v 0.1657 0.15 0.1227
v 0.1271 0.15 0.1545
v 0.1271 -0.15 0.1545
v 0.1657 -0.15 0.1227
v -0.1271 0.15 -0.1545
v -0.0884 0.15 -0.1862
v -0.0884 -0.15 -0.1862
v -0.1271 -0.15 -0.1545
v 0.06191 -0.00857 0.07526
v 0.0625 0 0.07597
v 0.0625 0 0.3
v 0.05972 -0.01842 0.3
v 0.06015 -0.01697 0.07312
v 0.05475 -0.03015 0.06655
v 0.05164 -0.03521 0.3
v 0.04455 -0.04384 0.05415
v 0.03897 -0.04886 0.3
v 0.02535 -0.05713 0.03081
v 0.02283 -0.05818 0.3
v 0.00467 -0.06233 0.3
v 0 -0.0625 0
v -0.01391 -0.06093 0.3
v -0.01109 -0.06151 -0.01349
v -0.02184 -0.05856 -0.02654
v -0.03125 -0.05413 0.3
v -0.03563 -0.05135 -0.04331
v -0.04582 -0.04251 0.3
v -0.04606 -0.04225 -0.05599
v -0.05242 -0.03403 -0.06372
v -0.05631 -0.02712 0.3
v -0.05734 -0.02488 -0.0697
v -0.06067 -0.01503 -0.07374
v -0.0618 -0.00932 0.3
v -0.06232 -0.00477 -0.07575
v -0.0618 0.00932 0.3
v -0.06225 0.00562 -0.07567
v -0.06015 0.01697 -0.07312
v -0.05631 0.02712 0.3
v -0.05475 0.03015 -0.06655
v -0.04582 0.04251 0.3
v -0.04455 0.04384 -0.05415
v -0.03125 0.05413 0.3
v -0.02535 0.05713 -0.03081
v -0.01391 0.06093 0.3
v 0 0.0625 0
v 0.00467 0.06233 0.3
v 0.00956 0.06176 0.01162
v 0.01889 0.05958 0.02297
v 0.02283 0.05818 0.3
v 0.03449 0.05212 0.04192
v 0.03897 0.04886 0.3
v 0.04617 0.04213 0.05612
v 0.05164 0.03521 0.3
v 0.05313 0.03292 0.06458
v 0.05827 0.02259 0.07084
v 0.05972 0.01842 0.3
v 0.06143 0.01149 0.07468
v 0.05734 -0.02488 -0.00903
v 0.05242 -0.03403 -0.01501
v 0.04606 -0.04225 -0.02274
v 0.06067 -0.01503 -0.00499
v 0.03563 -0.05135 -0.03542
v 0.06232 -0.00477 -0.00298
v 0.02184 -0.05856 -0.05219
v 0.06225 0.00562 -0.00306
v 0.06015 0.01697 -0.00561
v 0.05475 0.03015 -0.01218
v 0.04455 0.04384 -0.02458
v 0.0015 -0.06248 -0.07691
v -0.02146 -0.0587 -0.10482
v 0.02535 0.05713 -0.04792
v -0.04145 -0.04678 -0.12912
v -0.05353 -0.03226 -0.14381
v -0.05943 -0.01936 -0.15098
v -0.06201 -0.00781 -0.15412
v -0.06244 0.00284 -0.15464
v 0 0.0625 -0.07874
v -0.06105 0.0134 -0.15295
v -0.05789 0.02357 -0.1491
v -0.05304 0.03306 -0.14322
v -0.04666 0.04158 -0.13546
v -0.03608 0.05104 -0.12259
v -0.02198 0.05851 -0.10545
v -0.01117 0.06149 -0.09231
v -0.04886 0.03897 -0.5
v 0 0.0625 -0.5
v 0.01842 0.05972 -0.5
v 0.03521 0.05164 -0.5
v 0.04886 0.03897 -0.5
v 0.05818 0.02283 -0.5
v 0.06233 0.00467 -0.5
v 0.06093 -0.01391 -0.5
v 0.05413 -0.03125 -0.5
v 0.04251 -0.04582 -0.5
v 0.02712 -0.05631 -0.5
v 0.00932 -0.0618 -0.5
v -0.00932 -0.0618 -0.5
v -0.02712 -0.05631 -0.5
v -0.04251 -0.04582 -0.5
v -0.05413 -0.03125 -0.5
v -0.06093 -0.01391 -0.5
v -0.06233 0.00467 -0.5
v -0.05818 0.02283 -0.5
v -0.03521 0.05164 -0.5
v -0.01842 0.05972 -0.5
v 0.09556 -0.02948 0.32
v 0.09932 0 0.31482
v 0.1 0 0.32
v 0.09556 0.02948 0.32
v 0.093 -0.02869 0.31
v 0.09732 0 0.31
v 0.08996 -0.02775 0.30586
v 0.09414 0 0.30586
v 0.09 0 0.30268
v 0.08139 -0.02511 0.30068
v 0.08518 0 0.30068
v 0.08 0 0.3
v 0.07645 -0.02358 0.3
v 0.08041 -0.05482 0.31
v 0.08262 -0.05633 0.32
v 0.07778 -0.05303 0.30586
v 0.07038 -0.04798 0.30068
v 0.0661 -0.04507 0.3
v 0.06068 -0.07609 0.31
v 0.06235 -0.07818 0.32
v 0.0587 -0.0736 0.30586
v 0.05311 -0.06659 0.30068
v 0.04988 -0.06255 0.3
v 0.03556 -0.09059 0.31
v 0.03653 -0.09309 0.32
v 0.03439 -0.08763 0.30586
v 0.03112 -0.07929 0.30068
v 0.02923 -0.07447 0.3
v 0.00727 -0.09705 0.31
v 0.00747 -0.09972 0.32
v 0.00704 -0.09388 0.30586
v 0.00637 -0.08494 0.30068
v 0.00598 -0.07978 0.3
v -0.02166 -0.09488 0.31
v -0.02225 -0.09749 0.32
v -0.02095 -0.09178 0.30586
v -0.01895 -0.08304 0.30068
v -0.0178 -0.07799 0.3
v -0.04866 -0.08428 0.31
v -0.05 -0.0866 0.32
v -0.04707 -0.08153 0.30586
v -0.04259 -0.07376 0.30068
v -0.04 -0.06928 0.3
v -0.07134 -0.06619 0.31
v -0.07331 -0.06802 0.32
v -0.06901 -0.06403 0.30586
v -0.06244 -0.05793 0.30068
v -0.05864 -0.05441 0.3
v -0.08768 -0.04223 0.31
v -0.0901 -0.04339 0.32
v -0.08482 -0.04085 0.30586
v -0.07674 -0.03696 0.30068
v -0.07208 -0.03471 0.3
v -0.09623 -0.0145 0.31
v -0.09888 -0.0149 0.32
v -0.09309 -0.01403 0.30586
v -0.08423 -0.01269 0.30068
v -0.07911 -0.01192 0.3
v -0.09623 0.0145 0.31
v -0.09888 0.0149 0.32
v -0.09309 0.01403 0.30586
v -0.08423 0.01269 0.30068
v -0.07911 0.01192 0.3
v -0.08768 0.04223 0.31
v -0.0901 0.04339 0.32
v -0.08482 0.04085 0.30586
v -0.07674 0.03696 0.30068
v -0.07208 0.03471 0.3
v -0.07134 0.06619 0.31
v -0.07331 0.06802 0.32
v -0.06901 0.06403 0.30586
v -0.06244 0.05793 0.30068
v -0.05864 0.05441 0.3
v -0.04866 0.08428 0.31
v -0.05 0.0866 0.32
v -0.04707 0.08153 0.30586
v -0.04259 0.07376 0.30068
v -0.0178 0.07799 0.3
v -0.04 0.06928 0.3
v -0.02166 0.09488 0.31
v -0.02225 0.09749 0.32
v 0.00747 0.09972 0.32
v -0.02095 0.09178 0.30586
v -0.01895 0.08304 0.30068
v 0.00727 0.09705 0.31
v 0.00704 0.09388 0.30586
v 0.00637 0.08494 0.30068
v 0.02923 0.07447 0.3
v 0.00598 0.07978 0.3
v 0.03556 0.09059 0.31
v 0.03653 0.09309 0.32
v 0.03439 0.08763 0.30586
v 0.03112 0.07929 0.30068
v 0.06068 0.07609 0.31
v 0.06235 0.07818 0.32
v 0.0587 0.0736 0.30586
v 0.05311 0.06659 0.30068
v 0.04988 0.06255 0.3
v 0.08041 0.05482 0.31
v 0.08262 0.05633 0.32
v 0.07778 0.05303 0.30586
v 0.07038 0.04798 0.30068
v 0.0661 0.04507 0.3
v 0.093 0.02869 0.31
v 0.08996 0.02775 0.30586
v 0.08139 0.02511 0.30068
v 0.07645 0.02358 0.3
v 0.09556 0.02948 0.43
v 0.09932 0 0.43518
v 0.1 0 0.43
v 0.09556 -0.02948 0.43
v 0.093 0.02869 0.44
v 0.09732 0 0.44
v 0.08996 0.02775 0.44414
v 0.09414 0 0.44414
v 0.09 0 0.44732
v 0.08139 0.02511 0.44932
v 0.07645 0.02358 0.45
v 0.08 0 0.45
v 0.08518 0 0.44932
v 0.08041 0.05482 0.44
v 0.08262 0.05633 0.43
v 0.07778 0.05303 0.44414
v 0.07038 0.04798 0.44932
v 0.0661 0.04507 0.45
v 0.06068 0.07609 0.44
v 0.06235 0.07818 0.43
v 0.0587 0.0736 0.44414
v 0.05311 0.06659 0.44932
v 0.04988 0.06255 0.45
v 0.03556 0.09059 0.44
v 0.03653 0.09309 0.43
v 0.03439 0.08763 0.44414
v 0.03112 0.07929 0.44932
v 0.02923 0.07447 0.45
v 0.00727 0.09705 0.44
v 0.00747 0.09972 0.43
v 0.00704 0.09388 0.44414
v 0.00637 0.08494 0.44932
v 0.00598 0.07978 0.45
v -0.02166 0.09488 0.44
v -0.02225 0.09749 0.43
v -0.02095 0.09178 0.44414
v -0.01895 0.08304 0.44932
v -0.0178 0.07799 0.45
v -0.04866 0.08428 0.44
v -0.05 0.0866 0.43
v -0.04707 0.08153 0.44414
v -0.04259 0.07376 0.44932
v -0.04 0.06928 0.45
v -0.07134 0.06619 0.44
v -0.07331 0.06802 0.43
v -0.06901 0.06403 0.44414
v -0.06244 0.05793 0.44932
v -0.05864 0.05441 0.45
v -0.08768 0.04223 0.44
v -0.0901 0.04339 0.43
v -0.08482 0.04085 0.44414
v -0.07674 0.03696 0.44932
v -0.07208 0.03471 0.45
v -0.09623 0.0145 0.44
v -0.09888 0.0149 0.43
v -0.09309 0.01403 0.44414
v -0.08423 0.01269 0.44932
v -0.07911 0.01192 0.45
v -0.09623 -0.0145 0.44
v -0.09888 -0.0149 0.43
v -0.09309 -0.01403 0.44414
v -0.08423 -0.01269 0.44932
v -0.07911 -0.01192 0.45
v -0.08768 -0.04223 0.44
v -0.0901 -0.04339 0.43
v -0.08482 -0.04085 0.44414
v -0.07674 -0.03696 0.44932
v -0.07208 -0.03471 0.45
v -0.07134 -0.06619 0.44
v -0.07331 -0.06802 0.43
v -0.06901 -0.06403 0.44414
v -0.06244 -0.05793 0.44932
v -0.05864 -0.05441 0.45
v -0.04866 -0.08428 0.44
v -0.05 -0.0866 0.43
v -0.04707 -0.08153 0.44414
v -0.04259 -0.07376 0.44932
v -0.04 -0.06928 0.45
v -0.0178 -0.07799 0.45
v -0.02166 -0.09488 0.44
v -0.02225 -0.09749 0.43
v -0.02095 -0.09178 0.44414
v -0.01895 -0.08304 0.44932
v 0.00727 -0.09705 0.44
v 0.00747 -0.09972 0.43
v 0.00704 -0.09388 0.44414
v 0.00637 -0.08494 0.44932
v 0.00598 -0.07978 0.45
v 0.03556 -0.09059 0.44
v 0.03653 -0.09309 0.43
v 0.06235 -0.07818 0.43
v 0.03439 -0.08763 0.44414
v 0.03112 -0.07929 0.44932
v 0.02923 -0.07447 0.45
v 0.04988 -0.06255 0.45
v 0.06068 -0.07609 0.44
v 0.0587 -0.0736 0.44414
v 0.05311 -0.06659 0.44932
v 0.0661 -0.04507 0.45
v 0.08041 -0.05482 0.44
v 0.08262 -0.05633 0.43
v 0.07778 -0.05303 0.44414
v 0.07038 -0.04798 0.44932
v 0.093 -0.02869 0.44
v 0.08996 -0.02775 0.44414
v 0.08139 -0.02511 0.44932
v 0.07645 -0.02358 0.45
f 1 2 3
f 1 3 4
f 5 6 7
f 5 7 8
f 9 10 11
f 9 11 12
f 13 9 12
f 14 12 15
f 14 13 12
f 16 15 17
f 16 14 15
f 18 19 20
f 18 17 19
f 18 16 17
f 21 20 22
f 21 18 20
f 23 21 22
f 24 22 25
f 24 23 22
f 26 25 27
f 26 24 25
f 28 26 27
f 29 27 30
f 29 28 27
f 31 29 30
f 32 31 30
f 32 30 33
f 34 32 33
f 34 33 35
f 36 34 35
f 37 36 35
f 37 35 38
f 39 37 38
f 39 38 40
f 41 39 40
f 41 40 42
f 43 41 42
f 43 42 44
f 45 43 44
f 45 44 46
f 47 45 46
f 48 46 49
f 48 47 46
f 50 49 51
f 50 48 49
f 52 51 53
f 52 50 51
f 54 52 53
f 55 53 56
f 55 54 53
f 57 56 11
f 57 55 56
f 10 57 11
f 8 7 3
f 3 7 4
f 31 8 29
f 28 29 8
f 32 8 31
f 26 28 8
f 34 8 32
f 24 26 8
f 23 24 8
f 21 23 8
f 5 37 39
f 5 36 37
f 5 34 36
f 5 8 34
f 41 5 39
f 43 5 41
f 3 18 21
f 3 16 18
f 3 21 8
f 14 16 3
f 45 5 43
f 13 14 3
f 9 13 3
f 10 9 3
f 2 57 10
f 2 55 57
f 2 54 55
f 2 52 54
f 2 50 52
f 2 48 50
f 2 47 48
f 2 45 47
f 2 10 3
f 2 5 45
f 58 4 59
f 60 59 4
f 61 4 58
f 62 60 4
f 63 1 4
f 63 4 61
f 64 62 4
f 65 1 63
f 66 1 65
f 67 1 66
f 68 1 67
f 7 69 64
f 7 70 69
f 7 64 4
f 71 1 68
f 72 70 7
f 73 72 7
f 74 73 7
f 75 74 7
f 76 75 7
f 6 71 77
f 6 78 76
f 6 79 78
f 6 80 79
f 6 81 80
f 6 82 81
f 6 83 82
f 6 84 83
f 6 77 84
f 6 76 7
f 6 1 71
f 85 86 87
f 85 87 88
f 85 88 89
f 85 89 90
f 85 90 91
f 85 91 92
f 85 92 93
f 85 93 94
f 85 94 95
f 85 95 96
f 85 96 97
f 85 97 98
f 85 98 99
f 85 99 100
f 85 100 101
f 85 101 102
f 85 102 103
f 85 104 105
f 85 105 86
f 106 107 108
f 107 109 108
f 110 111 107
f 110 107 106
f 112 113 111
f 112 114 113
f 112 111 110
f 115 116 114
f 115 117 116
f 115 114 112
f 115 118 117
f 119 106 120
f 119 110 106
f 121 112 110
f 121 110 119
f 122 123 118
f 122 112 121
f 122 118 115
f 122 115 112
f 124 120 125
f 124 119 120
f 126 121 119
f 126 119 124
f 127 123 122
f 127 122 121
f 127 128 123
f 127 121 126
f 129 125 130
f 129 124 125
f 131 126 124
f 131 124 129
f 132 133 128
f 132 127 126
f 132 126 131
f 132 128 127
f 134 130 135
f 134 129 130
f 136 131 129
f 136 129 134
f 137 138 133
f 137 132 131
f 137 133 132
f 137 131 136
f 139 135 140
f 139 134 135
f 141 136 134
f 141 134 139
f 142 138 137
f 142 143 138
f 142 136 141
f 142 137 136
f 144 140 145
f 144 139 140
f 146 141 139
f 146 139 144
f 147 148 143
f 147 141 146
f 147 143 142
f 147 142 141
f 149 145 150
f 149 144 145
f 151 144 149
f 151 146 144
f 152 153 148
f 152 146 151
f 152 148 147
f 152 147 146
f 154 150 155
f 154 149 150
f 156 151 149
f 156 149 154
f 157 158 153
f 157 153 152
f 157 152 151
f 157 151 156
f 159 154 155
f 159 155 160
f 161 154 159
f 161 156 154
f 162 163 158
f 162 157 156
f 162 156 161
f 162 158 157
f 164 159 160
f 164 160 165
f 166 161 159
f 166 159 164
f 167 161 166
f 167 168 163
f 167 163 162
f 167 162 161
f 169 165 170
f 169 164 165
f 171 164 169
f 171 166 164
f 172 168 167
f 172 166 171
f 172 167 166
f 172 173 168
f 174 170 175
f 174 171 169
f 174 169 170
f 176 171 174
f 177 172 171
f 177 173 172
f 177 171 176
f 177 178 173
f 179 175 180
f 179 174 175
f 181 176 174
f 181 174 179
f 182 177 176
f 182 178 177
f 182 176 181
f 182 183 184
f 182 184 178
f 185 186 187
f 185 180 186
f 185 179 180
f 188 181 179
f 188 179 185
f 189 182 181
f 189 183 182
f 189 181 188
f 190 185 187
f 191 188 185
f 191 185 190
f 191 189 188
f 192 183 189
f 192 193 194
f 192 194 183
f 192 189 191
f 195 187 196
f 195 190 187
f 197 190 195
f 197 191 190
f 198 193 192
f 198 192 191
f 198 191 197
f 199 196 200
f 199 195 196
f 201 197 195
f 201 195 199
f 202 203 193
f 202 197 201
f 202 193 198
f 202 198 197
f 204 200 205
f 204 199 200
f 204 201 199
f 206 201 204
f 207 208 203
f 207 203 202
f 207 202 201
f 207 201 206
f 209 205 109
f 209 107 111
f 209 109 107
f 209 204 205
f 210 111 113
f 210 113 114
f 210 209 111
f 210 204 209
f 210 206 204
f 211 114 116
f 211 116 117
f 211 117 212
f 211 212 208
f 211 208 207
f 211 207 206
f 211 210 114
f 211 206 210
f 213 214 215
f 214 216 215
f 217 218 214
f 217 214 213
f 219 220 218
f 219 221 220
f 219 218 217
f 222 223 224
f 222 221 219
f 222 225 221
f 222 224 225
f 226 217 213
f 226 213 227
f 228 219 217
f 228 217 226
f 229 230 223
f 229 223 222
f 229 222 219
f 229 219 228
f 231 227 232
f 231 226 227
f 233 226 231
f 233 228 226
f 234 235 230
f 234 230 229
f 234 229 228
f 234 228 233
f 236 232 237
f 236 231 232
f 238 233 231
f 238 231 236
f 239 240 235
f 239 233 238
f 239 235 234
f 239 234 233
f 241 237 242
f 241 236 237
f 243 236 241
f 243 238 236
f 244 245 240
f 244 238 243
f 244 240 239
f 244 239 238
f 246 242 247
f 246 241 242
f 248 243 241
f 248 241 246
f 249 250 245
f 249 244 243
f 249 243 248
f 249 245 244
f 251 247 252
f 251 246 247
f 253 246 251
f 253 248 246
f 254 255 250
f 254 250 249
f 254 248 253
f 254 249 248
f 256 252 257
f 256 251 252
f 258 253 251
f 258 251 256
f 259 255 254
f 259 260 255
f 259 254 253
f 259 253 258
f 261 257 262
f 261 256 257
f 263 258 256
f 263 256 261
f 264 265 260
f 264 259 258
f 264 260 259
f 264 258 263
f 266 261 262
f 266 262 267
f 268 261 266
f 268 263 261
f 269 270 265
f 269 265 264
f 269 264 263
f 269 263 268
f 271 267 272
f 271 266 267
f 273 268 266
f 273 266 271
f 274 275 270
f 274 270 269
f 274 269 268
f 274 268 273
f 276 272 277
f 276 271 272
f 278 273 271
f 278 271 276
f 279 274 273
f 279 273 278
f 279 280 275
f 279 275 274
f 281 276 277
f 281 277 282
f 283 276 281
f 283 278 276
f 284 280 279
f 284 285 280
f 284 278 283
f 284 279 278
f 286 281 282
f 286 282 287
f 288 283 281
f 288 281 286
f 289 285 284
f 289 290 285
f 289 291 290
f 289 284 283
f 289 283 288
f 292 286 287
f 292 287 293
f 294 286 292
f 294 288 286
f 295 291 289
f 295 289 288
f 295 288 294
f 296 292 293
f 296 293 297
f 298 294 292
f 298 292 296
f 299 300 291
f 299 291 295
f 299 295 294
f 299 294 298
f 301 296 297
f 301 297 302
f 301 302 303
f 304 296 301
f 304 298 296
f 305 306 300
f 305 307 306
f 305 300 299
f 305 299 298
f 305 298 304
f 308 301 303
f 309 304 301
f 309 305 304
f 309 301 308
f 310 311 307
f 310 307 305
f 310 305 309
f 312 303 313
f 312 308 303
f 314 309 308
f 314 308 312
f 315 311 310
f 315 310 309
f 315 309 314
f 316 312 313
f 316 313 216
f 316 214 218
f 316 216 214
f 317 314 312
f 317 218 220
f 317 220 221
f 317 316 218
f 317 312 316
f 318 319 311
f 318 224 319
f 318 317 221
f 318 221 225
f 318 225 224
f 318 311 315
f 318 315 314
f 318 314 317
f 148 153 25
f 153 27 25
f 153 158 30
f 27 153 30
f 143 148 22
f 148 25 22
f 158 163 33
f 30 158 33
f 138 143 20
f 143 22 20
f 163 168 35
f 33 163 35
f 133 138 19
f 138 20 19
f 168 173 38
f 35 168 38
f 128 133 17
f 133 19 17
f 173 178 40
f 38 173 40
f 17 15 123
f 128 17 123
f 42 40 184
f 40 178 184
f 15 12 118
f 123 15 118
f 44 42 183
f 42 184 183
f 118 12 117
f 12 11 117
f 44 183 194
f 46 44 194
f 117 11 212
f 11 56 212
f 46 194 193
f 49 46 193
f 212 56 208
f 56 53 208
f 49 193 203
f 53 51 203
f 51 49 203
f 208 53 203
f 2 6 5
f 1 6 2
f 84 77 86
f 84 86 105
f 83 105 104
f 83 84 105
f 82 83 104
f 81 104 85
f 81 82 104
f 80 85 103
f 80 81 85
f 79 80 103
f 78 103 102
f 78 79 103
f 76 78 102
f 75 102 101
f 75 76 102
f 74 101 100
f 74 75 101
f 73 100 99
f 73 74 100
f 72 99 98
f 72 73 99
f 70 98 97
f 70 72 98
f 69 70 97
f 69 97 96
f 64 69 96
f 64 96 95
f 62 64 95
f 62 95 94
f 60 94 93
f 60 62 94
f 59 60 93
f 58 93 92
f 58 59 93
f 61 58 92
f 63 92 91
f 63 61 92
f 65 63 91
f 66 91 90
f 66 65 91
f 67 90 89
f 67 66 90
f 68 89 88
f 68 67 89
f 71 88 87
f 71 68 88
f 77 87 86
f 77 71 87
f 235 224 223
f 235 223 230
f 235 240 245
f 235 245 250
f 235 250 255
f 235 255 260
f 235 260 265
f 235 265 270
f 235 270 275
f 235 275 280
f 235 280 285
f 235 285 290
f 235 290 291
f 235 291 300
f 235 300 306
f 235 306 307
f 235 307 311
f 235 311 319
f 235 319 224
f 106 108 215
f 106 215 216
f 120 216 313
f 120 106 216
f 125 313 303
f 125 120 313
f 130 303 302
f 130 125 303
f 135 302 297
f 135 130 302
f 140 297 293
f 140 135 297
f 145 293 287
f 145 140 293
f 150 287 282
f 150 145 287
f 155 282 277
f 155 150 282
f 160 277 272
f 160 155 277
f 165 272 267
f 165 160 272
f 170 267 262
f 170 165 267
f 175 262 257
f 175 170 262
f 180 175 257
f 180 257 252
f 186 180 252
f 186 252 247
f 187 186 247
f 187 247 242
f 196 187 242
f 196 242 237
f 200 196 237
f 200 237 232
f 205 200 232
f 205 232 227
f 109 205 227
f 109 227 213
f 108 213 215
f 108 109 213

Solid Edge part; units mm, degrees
sketch "Sketch1" plane through (0, 0, 0) normal (0, 0, 1) x (1, 0, 0)
  circle A0 centre (0, 0) radius 0.0625
  dimension "D1" = 0.125
extrude "Protrusion1" add sketch "Sketch1" along normal blind 0.3
sketch "Sketch2" plane through (0, 0, 0) normal (0, -1, 0) x (1, 0, 0)
  line L0 (-0.1271, -0.1545) -> (0.1271, 0.1545)
  line L1 (0.1271, 0.1545) -> (0.1657, 0.1227)
  line L2 (0.1657, 0.1227) -> (-0.0884, -0.1862)
  line L3 (-0.0884, -0.1862) -> (-0.1271, -0.1545)
  dimension "D1" = 0.05
  dimension "D2" = 0.4
  dimension "D3" = 0.2
extrude "Ausprägung_2" add sketch "Sketch2" along normal mid plane 0.3
sketch "Sketch3" plane through (-0.0313, 0, 0) normal (0, 0, -1) x (0, 1, 0)
  circle A0 centre (0, 0.0313) radius 0.0625
extrude "Ausprägung_3" add sketch "Sketch3" along normal blind 0.5
sketch "Sketch4" plane through (0, 0, 0.3) normal (0, 0, 1) x (1, 0, 0)
  circle A0 centre (0, 0) radius 0.1
  dimension "D1" = 0.2
extrude "Ausprägung_4" add sketch "Sketch4" along normal blind 0.15
fillet "Verrundung_1" radius 0.02 2 edges at (-0.1, 0, 0.45) (-0.1, 0, 0.3)
